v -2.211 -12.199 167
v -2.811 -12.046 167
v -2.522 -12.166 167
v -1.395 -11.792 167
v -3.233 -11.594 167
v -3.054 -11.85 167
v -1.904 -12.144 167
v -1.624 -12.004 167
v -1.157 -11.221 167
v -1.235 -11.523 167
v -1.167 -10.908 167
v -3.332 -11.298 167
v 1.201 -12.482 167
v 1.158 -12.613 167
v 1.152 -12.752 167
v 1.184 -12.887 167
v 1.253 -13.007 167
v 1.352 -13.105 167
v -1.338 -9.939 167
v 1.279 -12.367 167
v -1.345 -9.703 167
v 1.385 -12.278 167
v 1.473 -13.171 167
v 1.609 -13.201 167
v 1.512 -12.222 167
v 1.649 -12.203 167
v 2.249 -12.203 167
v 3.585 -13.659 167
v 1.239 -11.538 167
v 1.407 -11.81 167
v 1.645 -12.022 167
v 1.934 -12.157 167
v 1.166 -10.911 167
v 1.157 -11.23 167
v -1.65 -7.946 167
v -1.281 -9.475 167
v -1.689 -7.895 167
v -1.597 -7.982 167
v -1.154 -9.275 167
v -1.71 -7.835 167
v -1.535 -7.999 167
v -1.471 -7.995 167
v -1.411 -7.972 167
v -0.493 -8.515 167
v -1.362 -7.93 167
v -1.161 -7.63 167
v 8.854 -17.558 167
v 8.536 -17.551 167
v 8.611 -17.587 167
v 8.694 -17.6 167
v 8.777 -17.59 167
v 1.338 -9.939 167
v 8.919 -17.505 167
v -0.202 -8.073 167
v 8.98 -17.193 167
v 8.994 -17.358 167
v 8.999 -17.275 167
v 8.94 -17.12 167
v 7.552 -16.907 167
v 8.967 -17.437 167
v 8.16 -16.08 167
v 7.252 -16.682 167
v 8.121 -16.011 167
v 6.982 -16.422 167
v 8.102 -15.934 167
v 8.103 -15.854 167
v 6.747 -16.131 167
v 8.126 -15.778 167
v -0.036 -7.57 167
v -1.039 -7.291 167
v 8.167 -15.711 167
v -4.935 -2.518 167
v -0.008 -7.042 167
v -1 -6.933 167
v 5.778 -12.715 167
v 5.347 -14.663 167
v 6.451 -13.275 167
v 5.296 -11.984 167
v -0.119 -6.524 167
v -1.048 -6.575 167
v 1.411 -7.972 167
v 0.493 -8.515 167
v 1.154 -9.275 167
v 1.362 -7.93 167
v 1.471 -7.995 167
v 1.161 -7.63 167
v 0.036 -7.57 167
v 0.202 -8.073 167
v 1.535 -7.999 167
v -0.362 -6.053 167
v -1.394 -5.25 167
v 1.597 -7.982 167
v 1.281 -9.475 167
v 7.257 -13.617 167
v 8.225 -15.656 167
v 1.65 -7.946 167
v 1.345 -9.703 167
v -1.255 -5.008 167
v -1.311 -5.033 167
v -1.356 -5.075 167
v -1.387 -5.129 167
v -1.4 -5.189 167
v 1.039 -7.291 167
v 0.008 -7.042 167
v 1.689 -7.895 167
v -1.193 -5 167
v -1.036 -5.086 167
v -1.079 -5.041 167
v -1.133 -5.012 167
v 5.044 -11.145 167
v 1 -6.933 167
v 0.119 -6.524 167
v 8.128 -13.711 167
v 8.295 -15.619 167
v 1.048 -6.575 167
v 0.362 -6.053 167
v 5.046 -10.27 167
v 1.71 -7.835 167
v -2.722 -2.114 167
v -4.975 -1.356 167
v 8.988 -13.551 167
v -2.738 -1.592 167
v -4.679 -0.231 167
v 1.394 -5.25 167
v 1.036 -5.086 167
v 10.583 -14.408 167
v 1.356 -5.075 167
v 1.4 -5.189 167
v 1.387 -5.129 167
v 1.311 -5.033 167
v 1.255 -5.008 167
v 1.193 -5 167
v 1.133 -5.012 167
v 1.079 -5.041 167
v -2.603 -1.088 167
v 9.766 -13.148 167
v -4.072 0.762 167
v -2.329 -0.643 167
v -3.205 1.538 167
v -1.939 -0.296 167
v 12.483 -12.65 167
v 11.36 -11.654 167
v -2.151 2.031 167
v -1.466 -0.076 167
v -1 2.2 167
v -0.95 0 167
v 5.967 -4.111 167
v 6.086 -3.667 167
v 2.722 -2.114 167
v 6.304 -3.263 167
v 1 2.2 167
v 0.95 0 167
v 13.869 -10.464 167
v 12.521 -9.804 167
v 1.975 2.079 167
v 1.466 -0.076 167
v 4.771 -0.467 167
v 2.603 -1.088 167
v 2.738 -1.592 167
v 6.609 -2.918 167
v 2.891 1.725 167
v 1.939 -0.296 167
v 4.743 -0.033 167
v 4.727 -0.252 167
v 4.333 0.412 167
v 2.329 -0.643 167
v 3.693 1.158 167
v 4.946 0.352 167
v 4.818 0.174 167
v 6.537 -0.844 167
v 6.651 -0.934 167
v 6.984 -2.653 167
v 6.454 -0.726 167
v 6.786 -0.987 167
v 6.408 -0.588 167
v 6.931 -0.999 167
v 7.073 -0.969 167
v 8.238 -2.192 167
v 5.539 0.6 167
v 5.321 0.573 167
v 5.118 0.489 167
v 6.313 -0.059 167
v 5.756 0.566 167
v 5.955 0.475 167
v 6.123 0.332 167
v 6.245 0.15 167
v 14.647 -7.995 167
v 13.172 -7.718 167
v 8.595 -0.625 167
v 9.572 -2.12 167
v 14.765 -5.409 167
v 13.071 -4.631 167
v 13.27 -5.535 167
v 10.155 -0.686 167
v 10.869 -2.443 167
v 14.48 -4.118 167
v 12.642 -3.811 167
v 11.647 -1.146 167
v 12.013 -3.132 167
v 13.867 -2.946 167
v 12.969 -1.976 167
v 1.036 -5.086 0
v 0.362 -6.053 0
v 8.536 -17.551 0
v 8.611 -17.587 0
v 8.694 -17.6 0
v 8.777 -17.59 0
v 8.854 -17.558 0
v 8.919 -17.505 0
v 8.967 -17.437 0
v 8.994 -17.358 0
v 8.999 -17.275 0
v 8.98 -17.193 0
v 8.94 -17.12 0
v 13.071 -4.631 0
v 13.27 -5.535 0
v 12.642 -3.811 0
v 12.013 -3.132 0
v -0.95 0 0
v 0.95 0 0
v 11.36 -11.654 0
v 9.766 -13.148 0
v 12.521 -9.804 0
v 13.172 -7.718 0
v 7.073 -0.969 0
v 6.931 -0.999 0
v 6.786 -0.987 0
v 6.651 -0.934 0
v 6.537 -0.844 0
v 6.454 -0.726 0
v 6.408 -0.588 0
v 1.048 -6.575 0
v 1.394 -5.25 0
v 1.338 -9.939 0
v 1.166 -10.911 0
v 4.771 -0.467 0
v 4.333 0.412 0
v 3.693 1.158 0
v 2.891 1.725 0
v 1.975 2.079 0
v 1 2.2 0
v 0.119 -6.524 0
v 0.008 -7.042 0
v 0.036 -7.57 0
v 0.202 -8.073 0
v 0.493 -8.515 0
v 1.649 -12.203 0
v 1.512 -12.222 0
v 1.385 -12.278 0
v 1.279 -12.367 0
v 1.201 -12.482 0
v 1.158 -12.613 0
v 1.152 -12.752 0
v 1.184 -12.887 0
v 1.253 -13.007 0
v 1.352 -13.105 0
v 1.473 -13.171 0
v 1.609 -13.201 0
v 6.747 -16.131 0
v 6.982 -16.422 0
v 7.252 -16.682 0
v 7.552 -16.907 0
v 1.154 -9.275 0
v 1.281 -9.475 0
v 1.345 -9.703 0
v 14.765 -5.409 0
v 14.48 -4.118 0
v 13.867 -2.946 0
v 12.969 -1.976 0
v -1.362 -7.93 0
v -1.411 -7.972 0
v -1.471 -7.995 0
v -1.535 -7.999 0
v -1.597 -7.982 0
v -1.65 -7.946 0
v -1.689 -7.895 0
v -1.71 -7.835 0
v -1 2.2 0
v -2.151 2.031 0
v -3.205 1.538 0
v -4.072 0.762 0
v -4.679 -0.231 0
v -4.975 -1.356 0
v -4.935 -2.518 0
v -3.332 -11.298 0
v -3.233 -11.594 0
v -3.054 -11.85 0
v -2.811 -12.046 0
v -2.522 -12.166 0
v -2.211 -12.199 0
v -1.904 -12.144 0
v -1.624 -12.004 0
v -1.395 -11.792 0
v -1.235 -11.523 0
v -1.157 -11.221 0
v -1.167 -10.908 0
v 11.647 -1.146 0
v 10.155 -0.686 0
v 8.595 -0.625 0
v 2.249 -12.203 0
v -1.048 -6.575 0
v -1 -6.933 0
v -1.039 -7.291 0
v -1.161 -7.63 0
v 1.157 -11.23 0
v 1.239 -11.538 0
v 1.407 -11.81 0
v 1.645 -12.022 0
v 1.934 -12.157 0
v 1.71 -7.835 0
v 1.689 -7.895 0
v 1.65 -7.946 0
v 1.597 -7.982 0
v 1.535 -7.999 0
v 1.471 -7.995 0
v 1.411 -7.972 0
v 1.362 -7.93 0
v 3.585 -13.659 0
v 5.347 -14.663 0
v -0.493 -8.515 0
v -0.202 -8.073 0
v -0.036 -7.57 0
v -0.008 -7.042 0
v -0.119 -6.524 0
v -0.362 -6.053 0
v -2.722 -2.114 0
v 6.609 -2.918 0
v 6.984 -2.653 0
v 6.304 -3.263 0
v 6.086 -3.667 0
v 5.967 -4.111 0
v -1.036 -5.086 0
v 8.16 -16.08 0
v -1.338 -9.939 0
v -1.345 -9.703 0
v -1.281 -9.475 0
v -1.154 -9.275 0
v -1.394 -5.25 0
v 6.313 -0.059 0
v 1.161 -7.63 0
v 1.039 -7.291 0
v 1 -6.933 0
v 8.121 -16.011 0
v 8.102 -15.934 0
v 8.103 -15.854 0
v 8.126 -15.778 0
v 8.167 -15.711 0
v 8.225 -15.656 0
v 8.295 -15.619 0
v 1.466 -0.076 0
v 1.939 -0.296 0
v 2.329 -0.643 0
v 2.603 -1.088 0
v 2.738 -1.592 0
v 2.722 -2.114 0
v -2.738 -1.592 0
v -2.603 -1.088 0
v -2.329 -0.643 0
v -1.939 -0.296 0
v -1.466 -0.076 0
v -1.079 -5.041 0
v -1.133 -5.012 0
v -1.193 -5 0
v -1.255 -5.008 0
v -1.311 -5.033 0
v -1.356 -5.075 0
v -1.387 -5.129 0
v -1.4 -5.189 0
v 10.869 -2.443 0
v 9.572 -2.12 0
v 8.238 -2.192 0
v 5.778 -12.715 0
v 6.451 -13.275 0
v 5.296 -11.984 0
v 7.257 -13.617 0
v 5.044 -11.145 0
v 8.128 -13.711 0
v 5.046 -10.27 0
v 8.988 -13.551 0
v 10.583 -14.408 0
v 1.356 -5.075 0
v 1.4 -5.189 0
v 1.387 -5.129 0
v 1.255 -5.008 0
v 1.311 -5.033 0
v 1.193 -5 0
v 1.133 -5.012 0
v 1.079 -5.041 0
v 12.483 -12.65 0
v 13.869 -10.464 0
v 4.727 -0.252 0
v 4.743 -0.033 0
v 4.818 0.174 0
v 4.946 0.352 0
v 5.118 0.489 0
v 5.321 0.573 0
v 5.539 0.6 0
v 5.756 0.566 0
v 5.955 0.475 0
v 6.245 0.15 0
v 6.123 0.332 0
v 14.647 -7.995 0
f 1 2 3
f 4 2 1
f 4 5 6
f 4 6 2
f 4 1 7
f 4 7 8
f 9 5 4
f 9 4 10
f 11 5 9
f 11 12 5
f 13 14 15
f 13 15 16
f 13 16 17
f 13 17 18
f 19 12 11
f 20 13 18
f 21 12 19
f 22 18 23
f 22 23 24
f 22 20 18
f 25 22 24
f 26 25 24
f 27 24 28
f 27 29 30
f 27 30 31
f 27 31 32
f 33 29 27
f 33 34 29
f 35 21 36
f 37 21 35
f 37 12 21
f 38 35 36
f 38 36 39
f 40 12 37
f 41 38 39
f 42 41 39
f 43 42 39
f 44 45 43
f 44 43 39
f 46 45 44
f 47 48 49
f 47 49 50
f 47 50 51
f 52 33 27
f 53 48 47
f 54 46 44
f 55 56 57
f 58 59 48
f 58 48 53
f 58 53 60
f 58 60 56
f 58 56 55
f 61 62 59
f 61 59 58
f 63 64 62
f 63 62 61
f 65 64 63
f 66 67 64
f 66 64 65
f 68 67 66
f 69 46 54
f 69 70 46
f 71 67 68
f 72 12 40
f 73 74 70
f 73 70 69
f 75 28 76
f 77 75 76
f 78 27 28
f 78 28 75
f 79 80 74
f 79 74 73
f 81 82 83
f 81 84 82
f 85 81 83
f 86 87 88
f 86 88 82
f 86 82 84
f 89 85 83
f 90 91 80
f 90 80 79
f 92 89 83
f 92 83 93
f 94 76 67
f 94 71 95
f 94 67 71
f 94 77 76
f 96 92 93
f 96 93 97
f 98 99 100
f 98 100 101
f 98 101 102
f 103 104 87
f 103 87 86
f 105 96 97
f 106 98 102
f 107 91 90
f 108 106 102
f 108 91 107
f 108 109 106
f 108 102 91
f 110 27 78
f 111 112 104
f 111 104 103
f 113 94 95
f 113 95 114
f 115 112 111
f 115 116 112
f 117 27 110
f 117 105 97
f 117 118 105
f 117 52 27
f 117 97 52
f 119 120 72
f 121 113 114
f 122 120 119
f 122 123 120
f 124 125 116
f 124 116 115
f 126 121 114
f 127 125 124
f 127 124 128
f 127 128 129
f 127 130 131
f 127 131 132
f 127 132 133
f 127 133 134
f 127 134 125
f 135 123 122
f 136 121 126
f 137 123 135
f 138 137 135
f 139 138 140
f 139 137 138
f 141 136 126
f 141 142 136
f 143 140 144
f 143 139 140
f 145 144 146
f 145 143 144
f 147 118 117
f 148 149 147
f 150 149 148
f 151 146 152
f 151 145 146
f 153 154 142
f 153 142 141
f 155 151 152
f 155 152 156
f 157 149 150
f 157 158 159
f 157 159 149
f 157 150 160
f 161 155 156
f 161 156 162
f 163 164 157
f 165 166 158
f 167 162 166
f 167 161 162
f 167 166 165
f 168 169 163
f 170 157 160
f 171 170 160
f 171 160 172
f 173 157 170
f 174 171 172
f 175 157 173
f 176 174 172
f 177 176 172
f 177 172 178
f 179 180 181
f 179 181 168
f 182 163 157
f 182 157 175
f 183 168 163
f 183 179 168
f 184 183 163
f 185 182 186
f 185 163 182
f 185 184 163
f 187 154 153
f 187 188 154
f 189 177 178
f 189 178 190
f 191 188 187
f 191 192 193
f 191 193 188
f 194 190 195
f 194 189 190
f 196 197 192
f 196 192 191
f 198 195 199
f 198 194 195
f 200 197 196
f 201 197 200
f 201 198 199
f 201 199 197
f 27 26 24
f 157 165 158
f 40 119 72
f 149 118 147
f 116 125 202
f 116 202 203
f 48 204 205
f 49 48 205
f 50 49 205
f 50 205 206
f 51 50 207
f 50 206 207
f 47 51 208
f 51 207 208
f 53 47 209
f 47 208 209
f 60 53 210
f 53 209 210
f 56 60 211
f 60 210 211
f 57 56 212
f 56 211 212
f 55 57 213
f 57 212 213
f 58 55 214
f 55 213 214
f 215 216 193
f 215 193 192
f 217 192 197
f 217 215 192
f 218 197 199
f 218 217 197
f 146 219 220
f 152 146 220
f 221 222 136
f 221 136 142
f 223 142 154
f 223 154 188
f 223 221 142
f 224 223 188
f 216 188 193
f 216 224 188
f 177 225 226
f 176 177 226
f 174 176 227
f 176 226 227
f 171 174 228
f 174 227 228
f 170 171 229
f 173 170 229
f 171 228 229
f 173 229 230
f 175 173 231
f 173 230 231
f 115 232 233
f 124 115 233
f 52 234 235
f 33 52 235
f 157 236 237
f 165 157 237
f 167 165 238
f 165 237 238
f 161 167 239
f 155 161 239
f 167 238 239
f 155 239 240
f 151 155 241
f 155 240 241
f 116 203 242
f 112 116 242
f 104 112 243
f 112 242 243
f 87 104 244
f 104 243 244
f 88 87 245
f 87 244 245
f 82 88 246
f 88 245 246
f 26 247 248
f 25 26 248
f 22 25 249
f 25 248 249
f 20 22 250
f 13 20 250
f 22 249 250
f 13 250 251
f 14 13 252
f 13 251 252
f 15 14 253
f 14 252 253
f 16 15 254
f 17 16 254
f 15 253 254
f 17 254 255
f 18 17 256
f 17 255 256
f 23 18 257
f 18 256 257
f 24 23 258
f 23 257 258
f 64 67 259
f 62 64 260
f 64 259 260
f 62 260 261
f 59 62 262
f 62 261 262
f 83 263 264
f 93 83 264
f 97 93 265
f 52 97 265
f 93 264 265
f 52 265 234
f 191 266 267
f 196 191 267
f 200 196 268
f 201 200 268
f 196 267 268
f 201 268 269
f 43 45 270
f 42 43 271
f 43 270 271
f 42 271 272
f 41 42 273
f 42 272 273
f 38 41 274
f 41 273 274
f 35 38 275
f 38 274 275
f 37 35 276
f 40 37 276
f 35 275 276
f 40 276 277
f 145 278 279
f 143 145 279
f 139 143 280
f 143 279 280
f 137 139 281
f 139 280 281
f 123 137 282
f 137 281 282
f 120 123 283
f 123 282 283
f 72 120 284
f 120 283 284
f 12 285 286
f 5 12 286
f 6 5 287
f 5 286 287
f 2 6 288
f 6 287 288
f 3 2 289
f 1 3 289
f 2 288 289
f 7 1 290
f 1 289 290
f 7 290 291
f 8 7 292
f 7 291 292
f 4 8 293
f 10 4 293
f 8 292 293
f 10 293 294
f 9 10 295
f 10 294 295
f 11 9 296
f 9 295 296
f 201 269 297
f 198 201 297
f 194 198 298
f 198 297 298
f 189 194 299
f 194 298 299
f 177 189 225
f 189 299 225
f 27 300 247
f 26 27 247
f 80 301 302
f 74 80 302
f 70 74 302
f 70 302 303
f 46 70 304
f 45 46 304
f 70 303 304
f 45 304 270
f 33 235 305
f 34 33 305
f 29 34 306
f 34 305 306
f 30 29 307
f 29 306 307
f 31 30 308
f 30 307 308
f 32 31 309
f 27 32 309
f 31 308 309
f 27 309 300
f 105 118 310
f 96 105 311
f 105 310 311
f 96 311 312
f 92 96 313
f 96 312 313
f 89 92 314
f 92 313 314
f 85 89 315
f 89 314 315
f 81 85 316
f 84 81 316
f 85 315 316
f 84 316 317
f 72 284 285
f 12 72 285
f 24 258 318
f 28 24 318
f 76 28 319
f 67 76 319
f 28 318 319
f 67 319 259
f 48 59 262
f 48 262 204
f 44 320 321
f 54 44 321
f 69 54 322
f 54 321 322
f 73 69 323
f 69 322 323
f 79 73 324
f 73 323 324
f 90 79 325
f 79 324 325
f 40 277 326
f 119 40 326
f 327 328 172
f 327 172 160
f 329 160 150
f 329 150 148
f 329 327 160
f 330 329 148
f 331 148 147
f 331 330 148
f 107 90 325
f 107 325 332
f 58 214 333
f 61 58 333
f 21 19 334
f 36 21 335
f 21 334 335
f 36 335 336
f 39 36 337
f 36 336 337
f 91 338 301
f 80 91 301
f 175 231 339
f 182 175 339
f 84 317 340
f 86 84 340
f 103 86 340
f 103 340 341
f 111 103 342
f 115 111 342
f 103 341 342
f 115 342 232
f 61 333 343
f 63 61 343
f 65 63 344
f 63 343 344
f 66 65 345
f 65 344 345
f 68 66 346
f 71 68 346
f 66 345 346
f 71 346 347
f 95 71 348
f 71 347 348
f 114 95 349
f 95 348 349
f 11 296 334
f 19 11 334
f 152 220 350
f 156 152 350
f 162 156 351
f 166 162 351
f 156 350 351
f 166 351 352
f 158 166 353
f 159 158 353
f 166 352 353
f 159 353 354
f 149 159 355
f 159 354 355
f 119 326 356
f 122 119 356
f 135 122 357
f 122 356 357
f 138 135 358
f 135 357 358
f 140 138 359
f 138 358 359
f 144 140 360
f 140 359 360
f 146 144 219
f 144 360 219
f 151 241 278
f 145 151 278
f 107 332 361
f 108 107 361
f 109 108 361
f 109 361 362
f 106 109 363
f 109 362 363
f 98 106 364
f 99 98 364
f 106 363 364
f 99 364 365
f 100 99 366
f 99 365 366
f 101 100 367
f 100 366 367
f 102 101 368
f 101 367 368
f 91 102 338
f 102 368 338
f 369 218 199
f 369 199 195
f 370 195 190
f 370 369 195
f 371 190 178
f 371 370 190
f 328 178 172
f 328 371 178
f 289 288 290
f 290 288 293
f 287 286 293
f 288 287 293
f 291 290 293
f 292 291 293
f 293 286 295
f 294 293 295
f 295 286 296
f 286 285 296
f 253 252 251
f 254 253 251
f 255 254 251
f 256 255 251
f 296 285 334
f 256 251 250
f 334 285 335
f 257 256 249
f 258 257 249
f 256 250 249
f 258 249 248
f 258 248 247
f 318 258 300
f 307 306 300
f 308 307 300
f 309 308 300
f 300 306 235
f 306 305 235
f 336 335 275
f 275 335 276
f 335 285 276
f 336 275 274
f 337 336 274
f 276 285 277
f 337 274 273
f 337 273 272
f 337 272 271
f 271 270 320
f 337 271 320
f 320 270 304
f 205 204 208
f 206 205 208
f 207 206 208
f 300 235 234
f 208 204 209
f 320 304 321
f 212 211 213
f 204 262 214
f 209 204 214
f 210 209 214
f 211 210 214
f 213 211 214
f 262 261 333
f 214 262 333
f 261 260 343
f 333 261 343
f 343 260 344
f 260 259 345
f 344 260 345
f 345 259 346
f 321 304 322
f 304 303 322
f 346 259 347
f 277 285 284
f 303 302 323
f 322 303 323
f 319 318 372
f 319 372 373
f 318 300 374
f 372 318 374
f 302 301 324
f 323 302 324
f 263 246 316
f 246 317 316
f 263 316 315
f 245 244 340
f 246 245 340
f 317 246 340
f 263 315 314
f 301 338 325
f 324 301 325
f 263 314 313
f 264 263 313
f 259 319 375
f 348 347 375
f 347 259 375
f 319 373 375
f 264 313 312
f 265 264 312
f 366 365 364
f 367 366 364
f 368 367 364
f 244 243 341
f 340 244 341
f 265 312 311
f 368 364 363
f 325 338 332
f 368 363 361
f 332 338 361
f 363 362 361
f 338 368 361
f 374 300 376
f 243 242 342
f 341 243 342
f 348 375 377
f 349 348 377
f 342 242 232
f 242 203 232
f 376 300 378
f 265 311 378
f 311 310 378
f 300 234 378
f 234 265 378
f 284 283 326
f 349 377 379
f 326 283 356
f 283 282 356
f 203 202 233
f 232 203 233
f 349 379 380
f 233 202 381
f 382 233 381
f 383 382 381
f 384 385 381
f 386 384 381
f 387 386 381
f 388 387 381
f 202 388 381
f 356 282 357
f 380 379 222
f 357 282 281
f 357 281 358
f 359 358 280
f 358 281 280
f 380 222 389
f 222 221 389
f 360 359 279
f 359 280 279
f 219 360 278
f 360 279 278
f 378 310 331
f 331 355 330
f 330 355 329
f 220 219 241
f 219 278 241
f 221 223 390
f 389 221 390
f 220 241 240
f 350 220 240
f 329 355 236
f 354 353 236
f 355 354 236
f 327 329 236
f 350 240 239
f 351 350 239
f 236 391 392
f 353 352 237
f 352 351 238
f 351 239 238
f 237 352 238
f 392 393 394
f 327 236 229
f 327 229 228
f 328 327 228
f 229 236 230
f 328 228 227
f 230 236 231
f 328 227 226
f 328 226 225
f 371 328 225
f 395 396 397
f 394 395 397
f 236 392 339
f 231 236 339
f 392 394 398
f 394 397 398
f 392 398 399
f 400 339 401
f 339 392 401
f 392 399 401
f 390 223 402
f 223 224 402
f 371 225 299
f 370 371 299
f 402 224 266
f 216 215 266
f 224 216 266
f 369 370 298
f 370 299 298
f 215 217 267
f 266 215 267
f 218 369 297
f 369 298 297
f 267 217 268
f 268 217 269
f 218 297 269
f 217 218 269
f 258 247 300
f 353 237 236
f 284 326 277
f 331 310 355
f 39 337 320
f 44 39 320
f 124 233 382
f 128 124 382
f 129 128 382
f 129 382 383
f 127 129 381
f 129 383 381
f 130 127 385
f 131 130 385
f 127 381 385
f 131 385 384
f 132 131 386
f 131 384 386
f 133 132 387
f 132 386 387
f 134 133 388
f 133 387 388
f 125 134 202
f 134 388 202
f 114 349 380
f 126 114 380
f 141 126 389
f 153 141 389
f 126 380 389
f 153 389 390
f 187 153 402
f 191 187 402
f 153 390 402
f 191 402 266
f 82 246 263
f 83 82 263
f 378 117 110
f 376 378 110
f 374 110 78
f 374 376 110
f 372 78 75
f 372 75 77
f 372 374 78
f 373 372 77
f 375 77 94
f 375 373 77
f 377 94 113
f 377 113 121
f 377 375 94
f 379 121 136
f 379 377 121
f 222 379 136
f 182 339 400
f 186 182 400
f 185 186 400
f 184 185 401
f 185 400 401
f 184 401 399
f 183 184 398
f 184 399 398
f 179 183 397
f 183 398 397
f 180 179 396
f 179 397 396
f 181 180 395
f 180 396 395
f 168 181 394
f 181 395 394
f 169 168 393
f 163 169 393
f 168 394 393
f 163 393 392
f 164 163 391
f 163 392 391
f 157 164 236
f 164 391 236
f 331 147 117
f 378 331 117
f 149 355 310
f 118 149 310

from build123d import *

# Parameters (mm, degrees)
AUFSATZ_LINEAR_AUSTRAGEN1_DEPTH = 167


with BuildPart() as part:
    # Skizze2 → Aufsatz-Linear austragen1 (new body)
    with BuildSketch(Plane.XY):
        with BuildLine():
            Line((2.249463717, -12.202979692), (1.649463717, -12.202979692))
            ThreePointArc((1.649463717, -12.202979692), (1.149883527, -12.682494733), (1.608528118, -13.201302152))
            ThreePointArc((1.608528118, -13.201302152), (4.502520079, -14.096742674), (6.747175365, -16.131079375))
            ThreePointArc((6.747175365, -16.131079375), (7.112932008, -16.556565076), (7.551520932, -16.906501858))
            Line((7.551520932, -16.906501858), (8.535645624, -17.550973384))
            ThreePointArc((8.535645624, -17.550973384), (8.918780894, -17.505267924), (8.94, -17.12))
            Line((8.94, -17.12), (8.16, -16.08))
            ThreePointArc((8.16, -16.08), (8.112111724, -15.815617889), (8.295145631, -15.618920721))
            ThreePointArc((8.295145631, -15.618920721), (13.246952934, -11.602086173), (14.764621506, -5.40918399))
            ThreePointArc((14.764621506, -5.40918399), (14.212742534, -3.511796734), (12.968892358, -1.976386191))
            ThreePointArc((12.968892358, -1.976386191), (10.155247914, -0.685662514), (7.072691879, -0.969230769))
            ThreePointArc((7.072691879, -0.969230769), (6.651398908, -0.933817355), (6.407847641, -0.588238626))
            Line((6.407847641, -0.588238626), (6.312927175, -0.058818198))
            ThreePointArc((6.312927175, -0.058818198), (5.320884778, 0.573394727), (4.771236166, -0.466666667))
            ThreePointArc((4.771236166, -0.466666667), (3.309401077, 1.465986324), (1, 2.2))
            Line((1, 2.2), (-1, 2.2))
            ThreePointArc((-1, 2.2), (-4.071944008, 0.761866509), (-4.934955236, -2.518419995))
            Line((-4.934955236, -2.518419995), (-3.33211269, -11.297565499))
            ThreePointArc((-3.33211269, -11.297565499), (-2.055417632, -12.182653085), (-1.166814744, -10.90840224))
            Line((-1.166814744, -10.90840224), (-1.338225332, -9.939343825))
            ThreePointArc((-1.338225332, -9.939343825), (-1.321388756, -9.586318071), (-1.154086658, -9.274997238))
            Line((-1.154086658, -9.274997238), (-0.493477704, -8.515448887))
            ThreePointArc((-0.493477704, -8.515448887), (-0.004204046, -7.306949206), (-0.36152629, -6.053082782))
            Line((-0.36152629, -6.053082782), (-1.035929659, -5.085628136))
            ThreePointArc((-1.035929659, -5.085628136), (-1.283701743, -5.018357444), (-1.393540989, -5.250417116))
            Line((-1.393540989, -5.250417116), (-1.048442583, -6.575179263))
            ThreePointArc((-1.048442583, -6.575179263), (-1.038559429, -7.2912299), (-1.361771833, -7.930260364))
            ThreePointArc((-1.361771833, -7.930260364), (-1.566325174, -7.992907386), (-1.710478362, -7.834835956))
            Line((-1.710478362, -7.834835956), (-2.722484964, -2.113523607))
            ThreePointArc((-2.722484964, -2.113523607), (-2.329192244, -0.643354526), (-0.95, 0))
            Line((-0.95, 0), (0.95, 0))
            ThreePointArc((0.95, 0), (2.329192244, -0.643354526), (2.722484964, -2.113523607))
            Line((2.722484964, -2.113523607), (1.710478362, -7.834835956))
            ThreePointArc((1.710478362, -7.834835956), (1.566325174, -7.992907386), (1.361771833, -7.930260364))
            ThreePointArc((1.361771833, -7.930260364), (1.038559429, -7.2912299), (1.048442583, -6.575179263))
            Line((1.048442583, -6.575179263), (1.393540989, -5.250417116))
            ThreePointArc((1.393540989, -5.250417116), (1.283701743, -5.018357444), (1.035929659, -5.085628136))
            Line((1.035929659, -5.085628136), (0.36152629, -6.053082782))
            ThreePointArc((0.36152629, -6.053082782), (0.004204046, -7.306949206), (0.493477704, -8.515448887))
            Line((0.493477704, -8.515448887), (1.154086658, -9.274997238))
            ThreePointArc((1.154086658, -9.274997238), (1.321388756, -9.586318071), (1.338225332, -9.939343825))
            Line((1.338225332, -9.939343825), (1.166286689, -10.911387565))
            ThreePointArc((1.166286689, -10.911387565), (1.406630414, -11.809817401), (2.249463717, -12.202979692))
        make_face()
        with BuildLine():
            Line((5.966676435, -4.111321151), (5.046108567, -10.269930006))
            ThreePointArc((5.046108567, -10.269930006), (6.451136103, -13.2747072), (9.765769631, -13.148244023))
            ThreePointArc((9.765769631, -13.148244023), (12.521328986, -9.803634295), (13.26992828, -5.535248103))
            ThreePointArc((13.26992828, -5.535248103), (12.883613, -4.207077023), (12.012917876, -3.132289643))
            ThreePointArc((12.012917876, -3.132289643), (9.572349016, -2.120338399), (6.984465825, -2.652581079))
            ThreePointArc((6.984465825, -2.652581079), (6.304480495, -3.262578078), (5.966676435, -4.111321151))
        make_face(mode=Mode.SUBTRACT)
    extrude(amount=AUFSATZ_LINEAR_AUSTRAGEN1_DEPTH)


solid = part.part
